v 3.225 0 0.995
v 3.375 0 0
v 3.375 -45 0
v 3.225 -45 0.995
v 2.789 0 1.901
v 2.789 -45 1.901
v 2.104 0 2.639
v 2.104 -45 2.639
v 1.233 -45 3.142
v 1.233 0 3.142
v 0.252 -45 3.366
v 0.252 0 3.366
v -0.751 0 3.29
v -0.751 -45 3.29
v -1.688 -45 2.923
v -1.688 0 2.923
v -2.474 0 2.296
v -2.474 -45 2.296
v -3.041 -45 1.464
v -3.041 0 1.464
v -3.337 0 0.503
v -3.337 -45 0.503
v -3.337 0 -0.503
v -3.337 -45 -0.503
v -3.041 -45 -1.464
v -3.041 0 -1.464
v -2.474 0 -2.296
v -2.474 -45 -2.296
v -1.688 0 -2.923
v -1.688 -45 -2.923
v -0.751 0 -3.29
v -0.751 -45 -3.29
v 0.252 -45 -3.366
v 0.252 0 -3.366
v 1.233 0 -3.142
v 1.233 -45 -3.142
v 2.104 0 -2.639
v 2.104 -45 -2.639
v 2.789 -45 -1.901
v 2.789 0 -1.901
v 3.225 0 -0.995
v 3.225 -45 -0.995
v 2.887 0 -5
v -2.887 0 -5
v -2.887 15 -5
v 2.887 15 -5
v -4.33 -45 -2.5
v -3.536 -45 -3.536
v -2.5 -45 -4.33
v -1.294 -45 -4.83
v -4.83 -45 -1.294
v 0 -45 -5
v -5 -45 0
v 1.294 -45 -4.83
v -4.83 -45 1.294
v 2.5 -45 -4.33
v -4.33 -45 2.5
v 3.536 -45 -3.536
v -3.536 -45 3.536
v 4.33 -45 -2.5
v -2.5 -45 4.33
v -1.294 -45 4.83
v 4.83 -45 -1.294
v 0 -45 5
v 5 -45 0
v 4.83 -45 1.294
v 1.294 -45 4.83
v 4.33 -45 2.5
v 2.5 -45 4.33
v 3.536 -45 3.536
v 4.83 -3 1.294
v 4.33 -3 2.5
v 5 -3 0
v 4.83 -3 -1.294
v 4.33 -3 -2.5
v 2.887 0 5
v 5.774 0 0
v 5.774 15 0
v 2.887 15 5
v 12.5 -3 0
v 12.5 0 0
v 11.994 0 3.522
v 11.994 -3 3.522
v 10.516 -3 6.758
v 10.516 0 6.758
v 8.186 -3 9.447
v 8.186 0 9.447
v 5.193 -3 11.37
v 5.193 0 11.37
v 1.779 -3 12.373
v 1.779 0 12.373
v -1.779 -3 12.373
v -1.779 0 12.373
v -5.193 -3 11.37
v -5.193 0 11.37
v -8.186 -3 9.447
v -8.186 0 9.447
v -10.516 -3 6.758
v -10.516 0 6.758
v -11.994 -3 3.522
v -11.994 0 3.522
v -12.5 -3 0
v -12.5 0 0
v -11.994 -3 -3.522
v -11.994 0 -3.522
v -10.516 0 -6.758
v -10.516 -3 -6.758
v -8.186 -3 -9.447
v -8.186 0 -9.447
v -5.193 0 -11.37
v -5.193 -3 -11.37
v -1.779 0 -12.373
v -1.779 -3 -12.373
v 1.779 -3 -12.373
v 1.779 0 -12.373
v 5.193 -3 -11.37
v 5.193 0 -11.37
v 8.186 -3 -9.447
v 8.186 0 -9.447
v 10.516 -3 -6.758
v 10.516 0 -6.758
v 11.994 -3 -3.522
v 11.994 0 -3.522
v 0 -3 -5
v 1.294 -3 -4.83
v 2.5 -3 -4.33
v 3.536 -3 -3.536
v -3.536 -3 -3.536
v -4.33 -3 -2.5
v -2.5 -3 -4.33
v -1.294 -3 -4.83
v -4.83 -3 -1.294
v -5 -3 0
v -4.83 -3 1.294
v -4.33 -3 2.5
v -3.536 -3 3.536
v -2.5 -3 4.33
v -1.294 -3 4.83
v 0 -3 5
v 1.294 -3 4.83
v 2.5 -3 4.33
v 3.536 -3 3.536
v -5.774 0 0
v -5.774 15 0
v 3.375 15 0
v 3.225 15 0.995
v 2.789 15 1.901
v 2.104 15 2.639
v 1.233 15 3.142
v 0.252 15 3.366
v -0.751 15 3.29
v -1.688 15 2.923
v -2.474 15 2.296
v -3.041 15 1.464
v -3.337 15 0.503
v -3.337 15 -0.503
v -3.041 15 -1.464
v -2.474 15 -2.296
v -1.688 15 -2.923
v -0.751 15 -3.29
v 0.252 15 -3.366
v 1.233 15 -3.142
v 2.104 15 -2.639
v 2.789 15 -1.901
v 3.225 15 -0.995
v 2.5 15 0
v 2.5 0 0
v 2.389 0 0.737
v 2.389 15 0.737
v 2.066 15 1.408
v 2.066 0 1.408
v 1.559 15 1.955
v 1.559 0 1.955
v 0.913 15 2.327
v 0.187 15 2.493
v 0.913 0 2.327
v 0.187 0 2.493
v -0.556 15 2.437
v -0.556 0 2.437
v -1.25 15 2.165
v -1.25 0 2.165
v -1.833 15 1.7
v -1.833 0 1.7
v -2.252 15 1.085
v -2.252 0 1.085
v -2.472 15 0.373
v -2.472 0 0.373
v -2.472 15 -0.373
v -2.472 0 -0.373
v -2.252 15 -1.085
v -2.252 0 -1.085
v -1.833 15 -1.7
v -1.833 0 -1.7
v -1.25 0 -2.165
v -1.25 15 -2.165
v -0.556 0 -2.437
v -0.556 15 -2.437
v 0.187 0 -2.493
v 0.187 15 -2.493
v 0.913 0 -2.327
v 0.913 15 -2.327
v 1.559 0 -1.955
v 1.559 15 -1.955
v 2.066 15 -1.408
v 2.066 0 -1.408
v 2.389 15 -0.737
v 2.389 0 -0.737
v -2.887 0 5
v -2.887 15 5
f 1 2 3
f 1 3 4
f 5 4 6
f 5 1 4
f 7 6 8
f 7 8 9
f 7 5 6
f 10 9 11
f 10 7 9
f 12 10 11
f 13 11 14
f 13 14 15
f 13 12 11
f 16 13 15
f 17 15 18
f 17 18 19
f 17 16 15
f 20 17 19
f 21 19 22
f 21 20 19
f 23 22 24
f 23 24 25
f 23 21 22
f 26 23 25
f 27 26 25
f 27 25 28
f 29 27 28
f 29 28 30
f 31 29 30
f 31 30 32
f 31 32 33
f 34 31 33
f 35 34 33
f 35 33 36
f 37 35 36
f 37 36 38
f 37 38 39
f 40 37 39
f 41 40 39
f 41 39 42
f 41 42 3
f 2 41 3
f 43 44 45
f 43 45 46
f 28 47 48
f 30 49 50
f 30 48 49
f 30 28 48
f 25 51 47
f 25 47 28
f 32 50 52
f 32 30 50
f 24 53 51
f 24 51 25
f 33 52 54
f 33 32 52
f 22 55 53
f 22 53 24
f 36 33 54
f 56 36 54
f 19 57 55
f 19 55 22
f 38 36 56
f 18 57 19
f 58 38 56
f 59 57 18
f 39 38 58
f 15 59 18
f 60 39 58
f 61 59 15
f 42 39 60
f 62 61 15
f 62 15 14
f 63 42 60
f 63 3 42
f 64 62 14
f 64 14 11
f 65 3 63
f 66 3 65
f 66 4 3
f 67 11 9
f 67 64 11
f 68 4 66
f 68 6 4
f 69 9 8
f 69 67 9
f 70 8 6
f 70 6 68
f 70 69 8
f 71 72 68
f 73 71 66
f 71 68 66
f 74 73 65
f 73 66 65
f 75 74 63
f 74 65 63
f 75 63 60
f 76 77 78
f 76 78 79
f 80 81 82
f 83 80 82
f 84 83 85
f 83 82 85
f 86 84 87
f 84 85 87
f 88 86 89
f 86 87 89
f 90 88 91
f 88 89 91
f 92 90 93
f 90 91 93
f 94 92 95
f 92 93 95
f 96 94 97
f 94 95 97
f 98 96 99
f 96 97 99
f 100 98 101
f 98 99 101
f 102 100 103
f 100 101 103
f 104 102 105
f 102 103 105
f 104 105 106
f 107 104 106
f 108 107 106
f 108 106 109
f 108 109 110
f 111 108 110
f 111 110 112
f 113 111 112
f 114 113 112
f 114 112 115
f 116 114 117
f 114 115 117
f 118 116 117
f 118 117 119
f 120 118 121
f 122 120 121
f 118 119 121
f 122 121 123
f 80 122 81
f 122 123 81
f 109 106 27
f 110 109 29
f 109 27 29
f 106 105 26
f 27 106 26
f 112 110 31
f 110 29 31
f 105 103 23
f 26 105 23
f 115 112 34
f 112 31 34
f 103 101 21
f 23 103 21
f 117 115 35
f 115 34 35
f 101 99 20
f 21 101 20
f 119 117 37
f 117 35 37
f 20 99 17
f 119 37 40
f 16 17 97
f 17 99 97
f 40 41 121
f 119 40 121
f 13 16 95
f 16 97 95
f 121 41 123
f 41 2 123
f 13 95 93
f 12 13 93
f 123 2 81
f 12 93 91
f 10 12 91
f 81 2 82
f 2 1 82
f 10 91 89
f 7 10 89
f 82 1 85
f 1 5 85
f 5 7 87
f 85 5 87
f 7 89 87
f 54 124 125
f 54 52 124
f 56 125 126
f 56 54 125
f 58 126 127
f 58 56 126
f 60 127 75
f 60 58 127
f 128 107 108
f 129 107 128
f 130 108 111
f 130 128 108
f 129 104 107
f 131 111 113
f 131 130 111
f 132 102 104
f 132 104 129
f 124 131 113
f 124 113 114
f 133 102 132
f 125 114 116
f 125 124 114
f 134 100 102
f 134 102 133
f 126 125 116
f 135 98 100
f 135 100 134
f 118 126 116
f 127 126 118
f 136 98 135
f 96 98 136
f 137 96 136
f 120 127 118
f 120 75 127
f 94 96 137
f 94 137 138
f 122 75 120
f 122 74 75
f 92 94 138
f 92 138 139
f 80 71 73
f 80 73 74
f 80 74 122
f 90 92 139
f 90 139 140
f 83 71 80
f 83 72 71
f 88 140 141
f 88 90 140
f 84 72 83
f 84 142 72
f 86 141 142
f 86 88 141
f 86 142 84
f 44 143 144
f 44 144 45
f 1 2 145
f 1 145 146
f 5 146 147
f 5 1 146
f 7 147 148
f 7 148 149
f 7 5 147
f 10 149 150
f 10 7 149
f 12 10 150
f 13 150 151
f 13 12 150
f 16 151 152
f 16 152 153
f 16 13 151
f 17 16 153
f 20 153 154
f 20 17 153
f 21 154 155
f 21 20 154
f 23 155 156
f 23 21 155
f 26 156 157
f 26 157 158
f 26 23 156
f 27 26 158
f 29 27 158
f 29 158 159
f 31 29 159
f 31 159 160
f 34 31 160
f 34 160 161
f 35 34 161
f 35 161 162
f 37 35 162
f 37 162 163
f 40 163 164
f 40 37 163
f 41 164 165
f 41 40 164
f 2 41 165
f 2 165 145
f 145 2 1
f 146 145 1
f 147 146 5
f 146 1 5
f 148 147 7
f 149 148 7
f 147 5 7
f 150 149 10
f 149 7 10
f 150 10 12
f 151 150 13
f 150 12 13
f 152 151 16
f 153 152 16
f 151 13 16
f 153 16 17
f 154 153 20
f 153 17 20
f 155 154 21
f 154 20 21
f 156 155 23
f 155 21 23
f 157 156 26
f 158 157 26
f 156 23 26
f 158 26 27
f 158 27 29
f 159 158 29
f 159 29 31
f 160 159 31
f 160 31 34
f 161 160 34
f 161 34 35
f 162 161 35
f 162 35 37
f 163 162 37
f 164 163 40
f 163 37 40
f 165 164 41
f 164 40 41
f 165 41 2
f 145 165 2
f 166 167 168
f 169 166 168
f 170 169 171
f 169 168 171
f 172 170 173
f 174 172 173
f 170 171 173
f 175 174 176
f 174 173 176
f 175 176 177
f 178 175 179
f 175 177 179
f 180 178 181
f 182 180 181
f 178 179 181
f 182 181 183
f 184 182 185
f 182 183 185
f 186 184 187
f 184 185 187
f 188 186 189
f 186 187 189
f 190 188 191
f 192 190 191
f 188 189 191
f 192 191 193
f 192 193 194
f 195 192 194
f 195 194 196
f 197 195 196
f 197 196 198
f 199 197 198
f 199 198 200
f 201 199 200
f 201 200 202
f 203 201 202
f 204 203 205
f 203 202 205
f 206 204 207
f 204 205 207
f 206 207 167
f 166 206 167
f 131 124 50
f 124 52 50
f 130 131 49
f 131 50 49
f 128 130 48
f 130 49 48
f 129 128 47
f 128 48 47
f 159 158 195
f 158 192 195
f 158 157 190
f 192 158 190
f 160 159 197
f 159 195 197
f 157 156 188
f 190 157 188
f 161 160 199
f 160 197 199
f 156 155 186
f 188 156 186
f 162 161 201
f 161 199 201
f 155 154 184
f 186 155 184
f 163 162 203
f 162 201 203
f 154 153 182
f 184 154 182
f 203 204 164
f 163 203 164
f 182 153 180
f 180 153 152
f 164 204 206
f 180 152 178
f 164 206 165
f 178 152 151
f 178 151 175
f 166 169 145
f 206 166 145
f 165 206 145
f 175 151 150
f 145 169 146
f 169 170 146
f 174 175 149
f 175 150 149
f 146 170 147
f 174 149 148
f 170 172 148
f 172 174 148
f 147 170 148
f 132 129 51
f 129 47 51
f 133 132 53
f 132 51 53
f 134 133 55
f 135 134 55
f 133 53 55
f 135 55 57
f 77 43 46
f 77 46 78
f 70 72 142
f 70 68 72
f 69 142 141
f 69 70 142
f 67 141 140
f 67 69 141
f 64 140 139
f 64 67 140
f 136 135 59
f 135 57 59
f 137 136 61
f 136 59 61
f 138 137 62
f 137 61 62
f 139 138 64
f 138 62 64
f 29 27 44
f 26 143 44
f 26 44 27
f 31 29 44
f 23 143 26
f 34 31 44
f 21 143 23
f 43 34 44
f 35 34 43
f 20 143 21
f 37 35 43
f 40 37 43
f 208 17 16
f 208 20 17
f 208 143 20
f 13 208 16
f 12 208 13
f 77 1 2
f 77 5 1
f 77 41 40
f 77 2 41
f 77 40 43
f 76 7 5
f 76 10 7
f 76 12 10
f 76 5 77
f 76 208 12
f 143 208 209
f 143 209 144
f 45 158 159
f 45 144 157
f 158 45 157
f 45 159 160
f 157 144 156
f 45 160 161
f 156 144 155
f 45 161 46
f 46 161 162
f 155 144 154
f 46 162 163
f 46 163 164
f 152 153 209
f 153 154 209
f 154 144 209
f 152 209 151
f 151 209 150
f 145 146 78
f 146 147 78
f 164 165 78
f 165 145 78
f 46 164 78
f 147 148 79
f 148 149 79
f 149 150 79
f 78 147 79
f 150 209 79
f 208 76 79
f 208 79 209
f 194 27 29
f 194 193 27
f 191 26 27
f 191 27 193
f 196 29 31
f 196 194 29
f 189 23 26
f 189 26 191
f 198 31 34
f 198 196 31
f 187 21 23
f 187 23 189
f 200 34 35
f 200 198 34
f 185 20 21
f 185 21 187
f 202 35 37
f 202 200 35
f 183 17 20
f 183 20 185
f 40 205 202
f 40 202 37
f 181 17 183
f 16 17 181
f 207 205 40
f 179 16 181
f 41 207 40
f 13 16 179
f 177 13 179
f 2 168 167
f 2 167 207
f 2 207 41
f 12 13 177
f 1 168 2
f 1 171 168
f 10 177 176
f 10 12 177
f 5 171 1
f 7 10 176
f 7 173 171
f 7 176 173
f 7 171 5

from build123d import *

# Parameters (mm, degrees)
F0_R      = 3.375
F1_DEPTH  = 45
F0_R_2    = 12.5
F2_DEPTH  = 3
F3_DEPTH  = 15
F4_R      = 5
F5_R      = 4.99999
F6_R      = 5
F7_R      = 4.99999
F8_R      = 4.99999
F9_R      = 5
F0_R_3    = 2.5
F10_DEPTH = 15


# Not quite as in the source:
# - a fillet or chamfer is up to 0.001 mm smaller than in the source, because OpenCascade refuses the exact size


with BuildPart() as f1:
    # F0 (on Front) → F1 (new body)
    with BuildSketch(Plane.XZ):
        Polygon((2.8867513459, -5), (5.7735026919, 0), (2.8867513459, 5), (-2.8867513459, 5), (-5.7735026919, 0), (-2.8867513459, -5), align=None)
        Circle(F0_R, mode=Mode.SUBTRACT)
    extrude(amount=F1_DEPTH)

    # F0 (on Front) → F2 (join)
    with BuildSketch(Plane.XZ):
        Circle(F0_R_2)
        Polygon((2.8867513459, 5), (5.7735026919, 0), (2.8867513459, -5), (-2.8867513459, -5), (-5.7735026919, 0), (-2.8867513459, 5), align=None, mode=Mode.SUBTRACT)
        Polygon((2.8867513459, -5), (5.7735026919, 0), (2.8867513459, 5), (-2.8867513459, 5), (-5.7735026919, 0), (-2.8867513459, -5), align=None)
        Circle(F0_R, mode=Mode.SUBTRACT)
    extrude(amount=F2_DEPTH)

    # F4
    f4_edges = [f1.edges().sort_by_distance(p)[0] for p in [
        (2.886751, -24, -5),
    ]]
    fillet(f4_edges, radius=F4_R)

    # F5 (radius 5 in the source; OpenCascade refuses exactly that, so slightly less here)
    f5_edges = [f1.edges().sort_by_distance(p)[0] for p in [
        (-2.886751, -24, -5),
    ]]
    fillet(f5_edges, radius=F5_R)

    # F6
    f6_edges = [f1.edges().sort_by_distance(p)[0] for p in [
        (-5.773503, -24, 0),
    ]]
    fillet(f6_edges, radius=F6_R)

    # F7 (radius 5 in the source; OpenCascade refuses exactly that, so slightly less here)
    f7_edges = [f1.edges().sort_by_distance(p)[0] for p in [
        (-2.886751, -24, 5),
    ]]
    fillet(f7_edges, radius=F7_R)

    # F8 (radius 5 in the source; OpenCascade refuses exactly that, so slightly less here)
    f8_edges = [f1.edges().sort_by_distance(p)[0] for p in [
        (5.773503, -24, 0),
    ]]
    fillet(f8_edges, radius=F8_R)

    # F9
    f9_edges = [f1.edges().sort_by_distance(p)[0] for p in [
        (2.886751, -24, 5),
    ]]
    fillet(f9_edges, radius=F9_R)


with BuildPart() as f3:
    # F0 (on Front) → F3 (new body)
    with BuildSketch(Plane.XZ):
        Polygon((2.8867513459, -5), (5.7735026919, 0), (2.8867513459, 5), (-2.8867513459, 5), (-5.7735026919, 0), (-2.8867513459, -5), align=None)
        Circle(F0_R, mode=Mode.SUBTRACT)
    extrude(amount=-F3_DEPTH)


with BuildPart() as f10:
    # F0 (on Front) → F10 (new body)
    with BuildSketch(Plane.XZ):
        Circle(F0_R)
        Circle(F0_R_3, mode=Mode.SUBTRACT)
    extrude(amount=-F10_DEPTH)


solid = Compound([f1.part, f3.part, f10.part])
